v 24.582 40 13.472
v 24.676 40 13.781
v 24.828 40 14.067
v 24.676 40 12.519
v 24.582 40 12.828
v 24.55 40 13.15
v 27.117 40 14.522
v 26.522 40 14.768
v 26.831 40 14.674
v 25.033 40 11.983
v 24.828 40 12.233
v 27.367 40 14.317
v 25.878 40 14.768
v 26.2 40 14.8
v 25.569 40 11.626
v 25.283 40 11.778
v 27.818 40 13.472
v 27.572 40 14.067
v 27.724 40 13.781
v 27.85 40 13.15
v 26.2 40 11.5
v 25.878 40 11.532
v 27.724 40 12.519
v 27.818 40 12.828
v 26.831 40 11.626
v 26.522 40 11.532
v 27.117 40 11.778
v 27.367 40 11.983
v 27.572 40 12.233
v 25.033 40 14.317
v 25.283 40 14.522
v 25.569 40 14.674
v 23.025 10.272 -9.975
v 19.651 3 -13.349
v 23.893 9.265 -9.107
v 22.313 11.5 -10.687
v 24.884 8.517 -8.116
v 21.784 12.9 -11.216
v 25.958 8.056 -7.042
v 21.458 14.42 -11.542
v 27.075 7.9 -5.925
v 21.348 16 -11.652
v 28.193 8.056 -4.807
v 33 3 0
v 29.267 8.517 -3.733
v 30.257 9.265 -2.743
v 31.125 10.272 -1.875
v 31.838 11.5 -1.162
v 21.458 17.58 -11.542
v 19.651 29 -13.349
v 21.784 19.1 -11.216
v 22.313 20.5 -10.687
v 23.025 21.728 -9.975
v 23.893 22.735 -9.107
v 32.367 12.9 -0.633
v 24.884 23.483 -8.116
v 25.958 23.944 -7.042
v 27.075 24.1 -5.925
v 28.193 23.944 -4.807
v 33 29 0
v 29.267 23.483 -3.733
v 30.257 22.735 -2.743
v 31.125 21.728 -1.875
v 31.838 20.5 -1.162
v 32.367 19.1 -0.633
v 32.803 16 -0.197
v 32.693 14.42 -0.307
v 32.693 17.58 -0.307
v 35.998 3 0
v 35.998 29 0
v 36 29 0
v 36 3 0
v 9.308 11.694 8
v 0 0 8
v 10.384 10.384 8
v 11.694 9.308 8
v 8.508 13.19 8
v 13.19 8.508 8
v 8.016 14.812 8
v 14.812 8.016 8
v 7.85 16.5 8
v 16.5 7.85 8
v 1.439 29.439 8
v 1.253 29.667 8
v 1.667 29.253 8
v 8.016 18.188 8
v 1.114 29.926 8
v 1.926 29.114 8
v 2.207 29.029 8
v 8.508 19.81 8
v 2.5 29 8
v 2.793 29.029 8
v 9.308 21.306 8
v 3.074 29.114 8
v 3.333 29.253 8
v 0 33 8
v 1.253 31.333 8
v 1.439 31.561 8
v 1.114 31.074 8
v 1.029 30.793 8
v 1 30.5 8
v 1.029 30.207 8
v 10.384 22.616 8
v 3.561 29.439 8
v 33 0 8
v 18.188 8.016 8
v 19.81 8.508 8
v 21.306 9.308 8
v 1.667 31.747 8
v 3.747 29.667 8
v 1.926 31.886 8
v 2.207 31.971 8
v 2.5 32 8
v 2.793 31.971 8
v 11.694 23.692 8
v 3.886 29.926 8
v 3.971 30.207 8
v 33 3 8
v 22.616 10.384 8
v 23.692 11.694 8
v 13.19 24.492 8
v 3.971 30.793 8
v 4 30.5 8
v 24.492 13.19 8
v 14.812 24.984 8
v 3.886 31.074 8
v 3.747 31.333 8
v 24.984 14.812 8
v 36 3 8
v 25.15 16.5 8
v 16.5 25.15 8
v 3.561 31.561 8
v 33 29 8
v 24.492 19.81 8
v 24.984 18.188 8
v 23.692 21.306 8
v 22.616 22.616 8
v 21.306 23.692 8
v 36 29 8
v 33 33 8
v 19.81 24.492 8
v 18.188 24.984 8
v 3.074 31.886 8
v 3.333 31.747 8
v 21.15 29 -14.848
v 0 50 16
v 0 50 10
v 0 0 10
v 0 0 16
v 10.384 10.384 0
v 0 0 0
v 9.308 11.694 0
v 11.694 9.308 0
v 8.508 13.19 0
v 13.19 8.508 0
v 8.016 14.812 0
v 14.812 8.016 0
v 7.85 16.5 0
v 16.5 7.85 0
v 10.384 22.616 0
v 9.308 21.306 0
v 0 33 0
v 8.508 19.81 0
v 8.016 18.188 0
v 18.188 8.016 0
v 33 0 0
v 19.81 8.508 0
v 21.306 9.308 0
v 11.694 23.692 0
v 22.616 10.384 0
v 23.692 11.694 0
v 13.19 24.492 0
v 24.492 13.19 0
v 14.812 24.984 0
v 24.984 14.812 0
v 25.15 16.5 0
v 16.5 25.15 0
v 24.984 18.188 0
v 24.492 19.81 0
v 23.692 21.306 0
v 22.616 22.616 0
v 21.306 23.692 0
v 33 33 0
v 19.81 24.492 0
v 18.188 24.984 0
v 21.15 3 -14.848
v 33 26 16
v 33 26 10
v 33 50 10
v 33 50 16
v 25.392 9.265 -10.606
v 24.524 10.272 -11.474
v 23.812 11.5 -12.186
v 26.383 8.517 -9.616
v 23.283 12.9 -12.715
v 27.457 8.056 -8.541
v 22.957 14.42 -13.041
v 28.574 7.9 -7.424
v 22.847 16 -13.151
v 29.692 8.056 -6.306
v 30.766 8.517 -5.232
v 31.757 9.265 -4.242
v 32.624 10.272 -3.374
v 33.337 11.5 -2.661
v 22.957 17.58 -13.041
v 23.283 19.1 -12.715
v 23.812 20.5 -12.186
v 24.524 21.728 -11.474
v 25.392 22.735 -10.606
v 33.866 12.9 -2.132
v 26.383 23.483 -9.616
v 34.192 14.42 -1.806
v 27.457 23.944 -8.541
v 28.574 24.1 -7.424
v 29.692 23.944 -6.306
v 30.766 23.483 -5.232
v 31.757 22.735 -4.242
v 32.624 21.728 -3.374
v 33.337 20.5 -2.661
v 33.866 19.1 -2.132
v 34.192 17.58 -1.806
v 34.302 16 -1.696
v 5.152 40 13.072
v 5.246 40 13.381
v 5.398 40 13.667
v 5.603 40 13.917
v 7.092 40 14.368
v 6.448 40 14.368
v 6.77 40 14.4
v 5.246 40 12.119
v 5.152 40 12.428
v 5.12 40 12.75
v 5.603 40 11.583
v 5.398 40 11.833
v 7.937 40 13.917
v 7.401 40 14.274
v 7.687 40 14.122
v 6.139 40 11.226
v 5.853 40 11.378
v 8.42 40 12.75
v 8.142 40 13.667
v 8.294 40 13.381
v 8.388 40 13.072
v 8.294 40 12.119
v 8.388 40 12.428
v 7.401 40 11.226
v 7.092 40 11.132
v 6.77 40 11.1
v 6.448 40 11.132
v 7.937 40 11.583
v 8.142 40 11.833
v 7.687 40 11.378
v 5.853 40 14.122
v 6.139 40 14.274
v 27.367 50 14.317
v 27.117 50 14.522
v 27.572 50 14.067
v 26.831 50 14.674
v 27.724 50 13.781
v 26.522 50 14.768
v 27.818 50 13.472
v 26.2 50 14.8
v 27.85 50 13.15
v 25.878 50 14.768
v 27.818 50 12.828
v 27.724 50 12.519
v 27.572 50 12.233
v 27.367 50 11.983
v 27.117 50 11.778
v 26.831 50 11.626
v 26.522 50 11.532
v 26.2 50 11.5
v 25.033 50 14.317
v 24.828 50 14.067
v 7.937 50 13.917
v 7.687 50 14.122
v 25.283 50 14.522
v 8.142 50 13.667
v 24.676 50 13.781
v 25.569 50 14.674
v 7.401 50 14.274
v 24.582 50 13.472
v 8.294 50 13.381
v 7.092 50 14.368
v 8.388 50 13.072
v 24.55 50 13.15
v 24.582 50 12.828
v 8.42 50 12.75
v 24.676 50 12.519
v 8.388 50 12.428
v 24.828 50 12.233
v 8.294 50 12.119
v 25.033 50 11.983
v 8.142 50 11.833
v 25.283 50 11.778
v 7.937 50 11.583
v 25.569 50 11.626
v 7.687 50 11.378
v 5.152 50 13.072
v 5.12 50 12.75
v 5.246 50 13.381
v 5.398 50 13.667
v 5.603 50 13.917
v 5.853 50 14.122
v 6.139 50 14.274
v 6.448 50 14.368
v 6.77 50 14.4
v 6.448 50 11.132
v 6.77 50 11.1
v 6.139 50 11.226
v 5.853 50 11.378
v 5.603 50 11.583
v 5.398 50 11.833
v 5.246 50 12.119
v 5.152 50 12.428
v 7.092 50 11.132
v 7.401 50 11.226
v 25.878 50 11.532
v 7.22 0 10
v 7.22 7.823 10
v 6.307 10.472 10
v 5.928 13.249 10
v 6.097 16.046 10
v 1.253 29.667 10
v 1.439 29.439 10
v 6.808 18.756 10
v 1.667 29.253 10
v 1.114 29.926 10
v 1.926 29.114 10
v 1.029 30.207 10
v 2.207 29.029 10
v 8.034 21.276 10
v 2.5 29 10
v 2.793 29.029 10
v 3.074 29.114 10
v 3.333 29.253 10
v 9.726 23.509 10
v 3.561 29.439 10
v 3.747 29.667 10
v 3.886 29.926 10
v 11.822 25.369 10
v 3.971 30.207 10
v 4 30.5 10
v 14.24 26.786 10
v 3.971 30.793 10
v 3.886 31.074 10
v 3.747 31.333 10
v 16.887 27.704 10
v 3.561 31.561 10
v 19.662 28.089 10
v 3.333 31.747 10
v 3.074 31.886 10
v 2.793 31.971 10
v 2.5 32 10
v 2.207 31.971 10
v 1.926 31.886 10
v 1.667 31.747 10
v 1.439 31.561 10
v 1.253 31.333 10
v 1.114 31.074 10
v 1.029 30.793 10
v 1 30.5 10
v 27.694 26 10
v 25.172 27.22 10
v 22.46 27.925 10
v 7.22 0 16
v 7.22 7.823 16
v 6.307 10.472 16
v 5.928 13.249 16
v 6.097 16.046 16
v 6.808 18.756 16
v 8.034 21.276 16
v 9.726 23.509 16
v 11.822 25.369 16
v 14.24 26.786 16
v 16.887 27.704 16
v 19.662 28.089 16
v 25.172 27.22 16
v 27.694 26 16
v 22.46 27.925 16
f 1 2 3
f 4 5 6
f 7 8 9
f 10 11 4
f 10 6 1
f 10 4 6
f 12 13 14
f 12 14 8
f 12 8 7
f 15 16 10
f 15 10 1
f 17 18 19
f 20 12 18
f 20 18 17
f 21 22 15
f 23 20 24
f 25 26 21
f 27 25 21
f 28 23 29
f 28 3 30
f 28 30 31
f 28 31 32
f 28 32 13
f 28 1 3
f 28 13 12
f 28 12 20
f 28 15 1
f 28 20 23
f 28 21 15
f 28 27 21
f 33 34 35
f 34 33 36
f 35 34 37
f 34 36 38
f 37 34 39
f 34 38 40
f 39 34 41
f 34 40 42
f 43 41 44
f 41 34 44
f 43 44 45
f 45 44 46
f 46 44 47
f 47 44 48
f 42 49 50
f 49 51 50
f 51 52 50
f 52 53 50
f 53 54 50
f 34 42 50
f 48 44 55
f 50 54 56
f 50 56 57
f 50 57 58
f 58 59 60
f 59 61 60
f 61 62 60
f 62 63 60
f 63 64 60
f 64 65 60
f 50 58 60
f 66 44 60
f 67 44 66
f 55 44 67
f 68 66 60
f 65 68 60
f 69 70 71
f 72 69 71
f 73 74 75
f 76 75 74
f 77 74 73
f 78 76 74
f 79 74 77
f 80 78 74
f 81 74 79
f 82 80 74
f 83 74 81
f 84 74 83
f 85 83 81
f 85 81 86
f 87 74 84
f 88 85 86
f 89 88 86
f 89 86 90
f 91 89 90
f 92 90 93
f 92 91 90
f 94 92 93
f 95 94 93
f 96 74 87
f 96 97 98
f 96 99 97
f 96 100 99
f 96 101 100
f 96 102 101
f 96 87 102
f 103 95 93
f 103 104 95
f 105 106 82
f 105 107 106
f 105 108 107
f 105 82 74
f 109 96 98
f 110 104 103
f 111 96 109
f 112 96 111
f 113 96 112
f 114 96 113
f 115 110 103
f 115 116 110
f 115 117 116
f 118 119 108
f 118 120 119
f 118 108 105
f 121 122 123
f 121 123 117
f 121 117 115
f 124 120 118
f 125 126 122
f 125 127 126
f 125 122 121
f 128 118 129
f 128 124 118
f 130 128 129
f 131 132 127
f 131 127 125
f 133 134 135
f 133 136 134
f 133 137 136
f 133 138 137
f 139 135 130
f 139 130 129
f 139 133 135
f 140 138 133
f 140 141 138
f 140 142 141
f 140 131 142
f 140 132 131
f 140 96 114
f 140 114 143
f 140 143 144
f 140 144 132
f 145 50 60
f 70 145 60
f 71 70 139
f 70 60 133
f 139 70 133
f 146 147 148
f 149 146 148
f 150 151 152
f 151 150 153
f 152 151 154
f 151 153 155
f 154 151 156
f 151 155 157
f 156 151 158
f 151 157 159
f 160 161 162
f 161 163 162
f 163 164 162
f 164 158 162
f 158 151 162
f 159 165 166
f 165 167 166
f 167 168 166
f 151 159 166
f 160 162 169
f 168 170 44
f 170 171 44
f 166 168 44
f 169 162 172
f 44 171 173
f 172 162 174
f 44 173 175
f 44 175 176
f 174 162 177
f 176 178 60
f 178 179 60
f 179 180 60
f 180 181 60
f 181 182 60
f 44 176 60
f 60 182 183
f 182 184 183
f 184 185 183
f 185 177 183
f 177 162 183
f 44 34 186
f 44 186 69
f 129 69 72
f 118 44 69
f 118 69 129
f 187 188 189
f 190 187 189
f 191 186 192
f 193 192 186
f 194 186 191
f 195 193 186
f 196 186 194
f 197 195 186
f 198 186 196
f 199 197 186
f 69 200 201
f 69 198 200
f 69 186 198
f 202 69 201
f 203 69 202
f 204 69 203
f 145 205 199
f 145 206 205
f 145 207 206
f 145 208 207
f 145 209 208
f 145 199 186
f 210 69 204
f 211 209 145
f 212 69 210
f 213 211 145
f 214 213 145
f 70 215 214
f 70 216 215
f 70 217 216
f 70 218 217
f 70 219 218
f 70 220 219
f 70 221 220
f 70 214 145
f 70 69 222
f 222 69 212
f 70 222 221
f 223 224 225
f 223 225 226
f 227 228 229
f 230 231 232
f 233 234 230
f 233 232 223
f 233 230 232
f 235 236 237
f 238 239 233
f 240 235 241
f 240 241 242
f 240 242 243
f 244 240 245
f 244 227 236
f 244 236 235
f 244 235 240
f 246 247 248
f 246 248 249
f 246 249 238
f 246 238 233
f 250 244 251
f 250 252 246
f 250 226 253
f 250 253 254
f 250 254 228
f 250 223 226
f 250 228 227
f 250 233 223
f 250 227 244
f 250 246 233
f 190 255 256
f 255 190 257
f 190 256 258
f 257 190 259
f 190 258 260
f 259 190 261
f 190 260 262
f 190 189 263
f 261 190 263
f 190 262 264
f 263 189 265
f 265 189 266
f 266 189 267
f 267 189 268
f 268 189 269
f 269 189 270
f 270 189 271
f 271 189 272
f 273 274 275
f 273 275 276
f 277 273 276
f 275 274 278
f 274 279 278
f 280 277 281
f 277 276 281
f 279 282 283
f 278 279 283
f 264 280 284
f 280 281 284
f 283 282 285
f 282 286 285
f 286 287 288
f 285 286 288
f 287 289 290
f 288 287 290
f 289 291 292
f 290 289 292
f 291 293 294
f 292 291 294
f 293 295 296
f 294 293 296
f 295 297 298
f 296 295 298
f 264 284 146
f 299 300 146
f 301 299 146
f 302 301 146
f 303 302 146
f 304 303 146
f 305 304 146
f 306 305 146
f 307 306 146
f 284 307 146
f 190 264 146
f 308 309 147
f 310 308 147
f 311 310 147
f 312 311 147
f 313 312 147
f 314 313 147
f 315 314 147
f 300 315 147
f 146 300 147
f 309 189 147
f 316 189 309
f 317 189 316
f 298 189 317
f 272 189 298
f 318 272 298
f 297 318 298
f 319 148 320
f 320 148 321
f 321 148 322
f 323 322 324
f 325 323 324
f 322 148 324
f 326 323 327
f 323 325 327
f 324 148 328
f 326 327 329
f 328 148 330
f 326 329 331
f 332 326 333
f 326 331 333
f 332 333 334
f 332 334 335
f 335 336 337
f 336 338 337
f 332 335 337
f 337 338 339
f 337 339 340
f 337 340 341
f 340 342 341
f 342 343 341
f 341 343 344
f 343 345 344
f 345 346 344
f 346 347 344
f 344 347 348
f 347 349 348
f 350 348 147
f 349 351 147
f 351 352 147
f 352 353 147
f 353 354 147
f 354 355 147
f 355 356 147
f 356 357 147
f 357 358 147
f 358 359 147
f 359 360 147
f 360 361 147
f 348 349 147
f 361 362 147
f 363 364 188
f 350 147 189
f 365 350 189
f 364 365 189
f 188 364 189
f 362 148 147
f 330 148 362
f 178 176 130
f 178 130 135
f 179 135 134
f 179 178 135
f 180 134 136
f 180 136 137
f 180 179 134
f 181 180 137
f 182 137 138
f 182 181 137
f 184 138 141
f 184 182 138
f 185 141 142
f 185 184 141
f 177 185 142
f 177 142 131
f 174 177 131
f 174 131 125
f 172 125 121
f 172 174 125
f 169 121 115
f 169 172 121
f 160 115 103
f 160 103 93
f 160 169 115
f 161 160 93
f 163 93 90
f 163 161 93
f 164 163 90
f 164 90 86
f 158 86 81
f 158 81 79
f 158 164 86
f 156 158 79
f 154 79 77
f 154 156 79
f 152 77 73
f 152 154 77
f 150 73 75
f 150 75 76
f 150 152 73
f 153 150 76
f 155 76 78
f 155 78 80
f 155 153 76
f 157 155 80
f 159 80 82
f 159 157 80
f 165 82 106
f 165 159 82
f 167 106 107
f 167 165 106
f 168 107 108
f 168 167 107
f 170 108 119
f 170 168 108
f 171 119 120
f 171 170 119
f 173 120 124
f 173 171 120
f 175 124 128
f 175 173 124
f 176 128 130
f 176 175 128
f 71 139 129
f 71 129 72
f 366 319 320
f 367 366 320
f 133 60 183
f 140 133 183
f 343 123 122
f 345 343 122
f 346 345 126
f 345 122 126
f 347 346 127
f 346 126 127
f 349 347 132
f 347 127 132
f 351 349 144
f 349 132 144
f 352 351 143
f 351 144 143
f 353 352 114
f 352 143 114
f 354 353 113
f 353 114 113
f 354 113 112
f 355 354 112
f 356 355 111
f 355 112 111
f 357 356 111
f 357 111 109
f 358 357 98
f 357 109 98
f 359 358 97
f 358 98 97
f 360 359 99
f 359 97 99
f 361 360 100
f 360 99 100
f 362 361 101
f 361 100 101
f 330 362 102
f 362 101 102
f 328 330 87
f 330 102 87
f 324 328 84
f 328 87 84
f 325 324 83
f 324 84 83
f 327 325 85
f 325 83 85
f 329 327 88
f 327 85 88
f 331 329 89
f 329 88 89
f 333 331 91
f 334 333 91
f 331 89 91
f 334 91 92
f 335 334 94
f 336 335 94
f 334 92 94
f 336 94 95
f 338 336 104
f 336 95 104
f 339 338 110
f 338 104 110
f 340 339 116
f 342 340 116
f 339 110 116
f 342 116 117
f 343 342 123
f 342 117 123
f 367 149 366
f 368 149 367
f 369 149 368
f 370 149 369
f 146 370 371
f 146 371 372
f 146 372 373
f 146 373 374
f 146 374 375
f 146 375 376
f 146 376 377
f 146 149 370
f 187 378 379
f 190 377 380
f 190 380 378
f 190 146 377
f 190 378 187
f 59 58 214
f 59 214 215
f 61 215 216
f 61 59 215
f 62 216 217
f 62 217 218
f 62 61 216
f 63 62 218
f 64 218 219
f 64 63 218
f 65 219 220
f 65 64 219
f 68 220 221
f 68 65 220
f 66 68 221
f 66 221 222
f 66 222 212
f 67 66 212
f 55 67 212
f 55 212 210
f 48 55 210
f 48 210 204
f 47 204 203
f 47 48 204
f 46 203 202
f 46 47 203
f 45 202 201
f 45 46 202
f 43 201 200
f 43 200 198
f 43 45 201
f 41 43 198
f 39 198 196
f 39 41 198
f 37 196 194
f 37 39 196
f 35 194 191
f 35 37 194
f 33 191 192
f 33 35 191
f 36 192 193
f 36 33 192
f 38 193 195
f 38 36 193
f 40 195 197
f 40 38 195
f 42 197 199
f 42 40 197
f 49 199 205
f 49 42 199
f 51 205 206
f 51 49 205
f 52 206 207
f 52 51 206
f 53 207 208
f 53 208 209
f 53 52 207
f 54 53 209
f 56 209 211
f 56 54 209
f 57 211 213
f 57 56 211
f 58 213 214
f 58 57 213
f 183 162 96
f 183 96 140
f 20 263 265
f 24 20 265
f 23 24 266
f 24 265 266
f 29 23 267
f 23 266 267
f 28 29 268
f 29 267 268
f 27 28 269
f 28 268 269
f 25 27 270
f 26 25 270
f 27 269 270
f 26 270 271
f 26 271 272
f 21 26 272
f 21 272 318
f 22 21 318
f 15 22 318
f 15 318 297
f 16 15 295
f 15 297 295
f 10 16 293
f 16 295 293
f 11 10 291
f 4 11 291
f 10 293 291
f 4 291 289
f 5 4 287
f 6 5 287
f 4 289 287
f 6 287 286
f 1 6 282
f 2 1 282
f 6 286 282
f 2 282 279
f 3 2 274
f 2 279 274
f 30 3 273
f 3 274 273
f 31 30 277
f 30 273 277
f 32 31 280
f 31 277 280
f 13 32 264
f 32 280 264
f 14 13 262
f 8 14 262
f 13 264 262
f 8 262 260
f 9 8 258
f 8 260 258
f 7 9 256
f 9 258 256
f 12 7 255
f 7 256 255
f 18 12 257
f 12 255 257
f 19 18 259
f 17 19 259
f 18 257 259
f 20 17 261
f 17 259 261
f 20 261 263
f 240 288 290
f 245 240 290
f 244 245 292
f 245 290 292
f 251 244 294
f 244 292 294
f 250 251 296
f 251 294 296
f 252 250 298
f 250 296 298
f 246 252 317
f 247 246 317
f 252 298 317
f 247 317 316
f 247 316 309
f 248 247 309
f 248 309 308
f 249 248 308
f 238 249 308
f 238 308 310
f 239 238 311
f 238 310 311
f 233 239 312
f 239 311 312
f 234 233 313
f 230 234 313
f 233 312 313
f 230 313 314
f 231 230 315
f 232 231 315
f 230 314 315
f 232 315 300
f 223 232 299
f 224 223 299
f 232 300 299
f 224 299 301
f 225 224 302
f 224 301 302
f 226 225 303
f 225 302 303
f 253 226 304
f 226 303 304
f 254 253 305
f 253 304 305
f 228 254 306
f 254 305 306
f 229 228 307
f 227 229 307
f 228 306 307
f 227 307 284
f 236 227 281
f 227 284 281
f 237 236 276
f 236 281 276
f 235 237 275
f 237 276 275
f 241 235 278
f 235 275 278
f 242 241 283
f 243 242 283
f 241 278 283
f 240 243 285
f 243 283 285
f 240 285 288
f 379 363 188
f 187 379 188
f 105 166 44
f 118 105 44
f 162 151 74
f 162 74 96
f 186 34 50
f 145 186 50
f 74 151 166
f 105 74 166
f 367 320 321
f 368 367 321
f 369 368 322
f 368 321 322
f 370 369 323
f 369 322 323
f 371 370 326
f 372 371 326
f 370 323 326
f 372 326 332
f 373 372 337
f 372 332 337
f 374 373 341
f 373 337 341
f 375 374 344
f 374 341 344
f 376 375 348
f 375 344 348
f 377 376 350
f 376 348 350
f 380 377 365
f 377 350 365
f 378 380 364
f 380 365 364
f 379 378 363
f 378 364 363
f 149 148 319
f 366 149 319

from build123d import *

# Parameters (mm, degrees)
SKETCH2_W           = 33
SKETCH2_H           = 33
SKETCH2_R           = 8.65
BOSS_EXTRUDE1_DEPTH = 8
SKETCH3_W           = 8
SKETCH3_H           = 26
BOSS_EXTRUDE2_DEPTH = 3
SKETCH4_W           = 26
SKETCH4_H           = 21
SKETCH4_R           = 8.1
BOSS_EXTRUDE3_DEPTH = 2.12
SKETCH5_R           = 1.5
BOSS_EXTRUDE4_DEPTH = 2
BOSS_EXTRUDE5_DEPTH = 6
SKETCH7_R           = 1.65
CUT_EXTRUDE1_DEPTH  = 10


with BuildPart() as part:
    # Sketch2 → Boss-Extrude1 (new body)
    with BuildSketch(Plane.XY):
        with Locations((16.5, 16.5)):
            Rectangle(SKETCH2_W, SKETCH2_H)
        with Locations((16.5, 16.5)):
            Circle(SKETCH2_R, mode=Mode.SUBTRACT)
    extrude(amount=BOSS_EXTRUDE1_DEPTH)

    # Sketch3 → Boss-Extrude2 (add)
    with BuildSketch(Plane(origin=(33, 0, 0), x_dir=(0, 0, -1), z_dir=(1, 0, 0))):
        with Locations((-4, 16)):
            Rectangle(SKETCH3_W, SKETCH3_H)
    extrude(amount=BOSS_EXTRUDE2_DEPTH)

    # Sketch4 → Boss-Extrude3 (add)
    with BuildSketch(Plane(origin=(16.5, 0, -16.5), x_dir=(0, 1, 0), z_dir=(0.707106781, 0, -0.707106781))):
        with Locations((16, 14.955844123)):
            Rectangle(SKETCH4_W, SKETCH4_H)
        with Locations((16, 14.955844123)):
            Circle(SKETCH4_R, mode=Mode.SUBTRACT)
    extrude(amount=BOSS_EXTRUDE3_DEPTH)

    # Sketch5 → Boss-Extrude4 (add)
    with BuildSketch(Plane.XY.offset(8)):
        with Locations((2.5, 30.5)):
            Circle(SKETCH5_R)
    extrude(amount=BOSS_EXTRUDE4_DEPTH)

    # Sketch6 → Boss-Extrude5 (add)
    with BuildSketch(Plane.XY.offset(10)):
        with BuildLine():
            Line((7.22, 0), (7.22, 7.823187296))
            ThreePointArc((7.22, 7.823187296), (10.728461041, 24.490588089), (27.694109386, 26))
            Line((27.694109386, 26), (33, 26))
            Line((33, 26), (33, 50))
            Line((33, 50), (0, 50))
            Line((0, 50), (0, 0))
            Line((0, 0), (7.22, 0))
        make_face()
    extrude(amount=BOSS_EXTRUDE5_DEPTH)

    # Sketch7 → Cut-Extrude1 (cut)
    with BuildSketch(Plane(origin=(0, 50, 0), x_dir=(1, 0, 0), z_dir=(0, 1, 0))):
        with Locations((6.77, -12.75)):
            Circle(SKETCH7_R)
        with Locations((26.2, -13.15)):
            Circle(SKETCH7_R)
    extrude(amount=-CUT_EXTRUDE1_DEPTH, mode=Mode.SUBTRACT)


solid = part.part
